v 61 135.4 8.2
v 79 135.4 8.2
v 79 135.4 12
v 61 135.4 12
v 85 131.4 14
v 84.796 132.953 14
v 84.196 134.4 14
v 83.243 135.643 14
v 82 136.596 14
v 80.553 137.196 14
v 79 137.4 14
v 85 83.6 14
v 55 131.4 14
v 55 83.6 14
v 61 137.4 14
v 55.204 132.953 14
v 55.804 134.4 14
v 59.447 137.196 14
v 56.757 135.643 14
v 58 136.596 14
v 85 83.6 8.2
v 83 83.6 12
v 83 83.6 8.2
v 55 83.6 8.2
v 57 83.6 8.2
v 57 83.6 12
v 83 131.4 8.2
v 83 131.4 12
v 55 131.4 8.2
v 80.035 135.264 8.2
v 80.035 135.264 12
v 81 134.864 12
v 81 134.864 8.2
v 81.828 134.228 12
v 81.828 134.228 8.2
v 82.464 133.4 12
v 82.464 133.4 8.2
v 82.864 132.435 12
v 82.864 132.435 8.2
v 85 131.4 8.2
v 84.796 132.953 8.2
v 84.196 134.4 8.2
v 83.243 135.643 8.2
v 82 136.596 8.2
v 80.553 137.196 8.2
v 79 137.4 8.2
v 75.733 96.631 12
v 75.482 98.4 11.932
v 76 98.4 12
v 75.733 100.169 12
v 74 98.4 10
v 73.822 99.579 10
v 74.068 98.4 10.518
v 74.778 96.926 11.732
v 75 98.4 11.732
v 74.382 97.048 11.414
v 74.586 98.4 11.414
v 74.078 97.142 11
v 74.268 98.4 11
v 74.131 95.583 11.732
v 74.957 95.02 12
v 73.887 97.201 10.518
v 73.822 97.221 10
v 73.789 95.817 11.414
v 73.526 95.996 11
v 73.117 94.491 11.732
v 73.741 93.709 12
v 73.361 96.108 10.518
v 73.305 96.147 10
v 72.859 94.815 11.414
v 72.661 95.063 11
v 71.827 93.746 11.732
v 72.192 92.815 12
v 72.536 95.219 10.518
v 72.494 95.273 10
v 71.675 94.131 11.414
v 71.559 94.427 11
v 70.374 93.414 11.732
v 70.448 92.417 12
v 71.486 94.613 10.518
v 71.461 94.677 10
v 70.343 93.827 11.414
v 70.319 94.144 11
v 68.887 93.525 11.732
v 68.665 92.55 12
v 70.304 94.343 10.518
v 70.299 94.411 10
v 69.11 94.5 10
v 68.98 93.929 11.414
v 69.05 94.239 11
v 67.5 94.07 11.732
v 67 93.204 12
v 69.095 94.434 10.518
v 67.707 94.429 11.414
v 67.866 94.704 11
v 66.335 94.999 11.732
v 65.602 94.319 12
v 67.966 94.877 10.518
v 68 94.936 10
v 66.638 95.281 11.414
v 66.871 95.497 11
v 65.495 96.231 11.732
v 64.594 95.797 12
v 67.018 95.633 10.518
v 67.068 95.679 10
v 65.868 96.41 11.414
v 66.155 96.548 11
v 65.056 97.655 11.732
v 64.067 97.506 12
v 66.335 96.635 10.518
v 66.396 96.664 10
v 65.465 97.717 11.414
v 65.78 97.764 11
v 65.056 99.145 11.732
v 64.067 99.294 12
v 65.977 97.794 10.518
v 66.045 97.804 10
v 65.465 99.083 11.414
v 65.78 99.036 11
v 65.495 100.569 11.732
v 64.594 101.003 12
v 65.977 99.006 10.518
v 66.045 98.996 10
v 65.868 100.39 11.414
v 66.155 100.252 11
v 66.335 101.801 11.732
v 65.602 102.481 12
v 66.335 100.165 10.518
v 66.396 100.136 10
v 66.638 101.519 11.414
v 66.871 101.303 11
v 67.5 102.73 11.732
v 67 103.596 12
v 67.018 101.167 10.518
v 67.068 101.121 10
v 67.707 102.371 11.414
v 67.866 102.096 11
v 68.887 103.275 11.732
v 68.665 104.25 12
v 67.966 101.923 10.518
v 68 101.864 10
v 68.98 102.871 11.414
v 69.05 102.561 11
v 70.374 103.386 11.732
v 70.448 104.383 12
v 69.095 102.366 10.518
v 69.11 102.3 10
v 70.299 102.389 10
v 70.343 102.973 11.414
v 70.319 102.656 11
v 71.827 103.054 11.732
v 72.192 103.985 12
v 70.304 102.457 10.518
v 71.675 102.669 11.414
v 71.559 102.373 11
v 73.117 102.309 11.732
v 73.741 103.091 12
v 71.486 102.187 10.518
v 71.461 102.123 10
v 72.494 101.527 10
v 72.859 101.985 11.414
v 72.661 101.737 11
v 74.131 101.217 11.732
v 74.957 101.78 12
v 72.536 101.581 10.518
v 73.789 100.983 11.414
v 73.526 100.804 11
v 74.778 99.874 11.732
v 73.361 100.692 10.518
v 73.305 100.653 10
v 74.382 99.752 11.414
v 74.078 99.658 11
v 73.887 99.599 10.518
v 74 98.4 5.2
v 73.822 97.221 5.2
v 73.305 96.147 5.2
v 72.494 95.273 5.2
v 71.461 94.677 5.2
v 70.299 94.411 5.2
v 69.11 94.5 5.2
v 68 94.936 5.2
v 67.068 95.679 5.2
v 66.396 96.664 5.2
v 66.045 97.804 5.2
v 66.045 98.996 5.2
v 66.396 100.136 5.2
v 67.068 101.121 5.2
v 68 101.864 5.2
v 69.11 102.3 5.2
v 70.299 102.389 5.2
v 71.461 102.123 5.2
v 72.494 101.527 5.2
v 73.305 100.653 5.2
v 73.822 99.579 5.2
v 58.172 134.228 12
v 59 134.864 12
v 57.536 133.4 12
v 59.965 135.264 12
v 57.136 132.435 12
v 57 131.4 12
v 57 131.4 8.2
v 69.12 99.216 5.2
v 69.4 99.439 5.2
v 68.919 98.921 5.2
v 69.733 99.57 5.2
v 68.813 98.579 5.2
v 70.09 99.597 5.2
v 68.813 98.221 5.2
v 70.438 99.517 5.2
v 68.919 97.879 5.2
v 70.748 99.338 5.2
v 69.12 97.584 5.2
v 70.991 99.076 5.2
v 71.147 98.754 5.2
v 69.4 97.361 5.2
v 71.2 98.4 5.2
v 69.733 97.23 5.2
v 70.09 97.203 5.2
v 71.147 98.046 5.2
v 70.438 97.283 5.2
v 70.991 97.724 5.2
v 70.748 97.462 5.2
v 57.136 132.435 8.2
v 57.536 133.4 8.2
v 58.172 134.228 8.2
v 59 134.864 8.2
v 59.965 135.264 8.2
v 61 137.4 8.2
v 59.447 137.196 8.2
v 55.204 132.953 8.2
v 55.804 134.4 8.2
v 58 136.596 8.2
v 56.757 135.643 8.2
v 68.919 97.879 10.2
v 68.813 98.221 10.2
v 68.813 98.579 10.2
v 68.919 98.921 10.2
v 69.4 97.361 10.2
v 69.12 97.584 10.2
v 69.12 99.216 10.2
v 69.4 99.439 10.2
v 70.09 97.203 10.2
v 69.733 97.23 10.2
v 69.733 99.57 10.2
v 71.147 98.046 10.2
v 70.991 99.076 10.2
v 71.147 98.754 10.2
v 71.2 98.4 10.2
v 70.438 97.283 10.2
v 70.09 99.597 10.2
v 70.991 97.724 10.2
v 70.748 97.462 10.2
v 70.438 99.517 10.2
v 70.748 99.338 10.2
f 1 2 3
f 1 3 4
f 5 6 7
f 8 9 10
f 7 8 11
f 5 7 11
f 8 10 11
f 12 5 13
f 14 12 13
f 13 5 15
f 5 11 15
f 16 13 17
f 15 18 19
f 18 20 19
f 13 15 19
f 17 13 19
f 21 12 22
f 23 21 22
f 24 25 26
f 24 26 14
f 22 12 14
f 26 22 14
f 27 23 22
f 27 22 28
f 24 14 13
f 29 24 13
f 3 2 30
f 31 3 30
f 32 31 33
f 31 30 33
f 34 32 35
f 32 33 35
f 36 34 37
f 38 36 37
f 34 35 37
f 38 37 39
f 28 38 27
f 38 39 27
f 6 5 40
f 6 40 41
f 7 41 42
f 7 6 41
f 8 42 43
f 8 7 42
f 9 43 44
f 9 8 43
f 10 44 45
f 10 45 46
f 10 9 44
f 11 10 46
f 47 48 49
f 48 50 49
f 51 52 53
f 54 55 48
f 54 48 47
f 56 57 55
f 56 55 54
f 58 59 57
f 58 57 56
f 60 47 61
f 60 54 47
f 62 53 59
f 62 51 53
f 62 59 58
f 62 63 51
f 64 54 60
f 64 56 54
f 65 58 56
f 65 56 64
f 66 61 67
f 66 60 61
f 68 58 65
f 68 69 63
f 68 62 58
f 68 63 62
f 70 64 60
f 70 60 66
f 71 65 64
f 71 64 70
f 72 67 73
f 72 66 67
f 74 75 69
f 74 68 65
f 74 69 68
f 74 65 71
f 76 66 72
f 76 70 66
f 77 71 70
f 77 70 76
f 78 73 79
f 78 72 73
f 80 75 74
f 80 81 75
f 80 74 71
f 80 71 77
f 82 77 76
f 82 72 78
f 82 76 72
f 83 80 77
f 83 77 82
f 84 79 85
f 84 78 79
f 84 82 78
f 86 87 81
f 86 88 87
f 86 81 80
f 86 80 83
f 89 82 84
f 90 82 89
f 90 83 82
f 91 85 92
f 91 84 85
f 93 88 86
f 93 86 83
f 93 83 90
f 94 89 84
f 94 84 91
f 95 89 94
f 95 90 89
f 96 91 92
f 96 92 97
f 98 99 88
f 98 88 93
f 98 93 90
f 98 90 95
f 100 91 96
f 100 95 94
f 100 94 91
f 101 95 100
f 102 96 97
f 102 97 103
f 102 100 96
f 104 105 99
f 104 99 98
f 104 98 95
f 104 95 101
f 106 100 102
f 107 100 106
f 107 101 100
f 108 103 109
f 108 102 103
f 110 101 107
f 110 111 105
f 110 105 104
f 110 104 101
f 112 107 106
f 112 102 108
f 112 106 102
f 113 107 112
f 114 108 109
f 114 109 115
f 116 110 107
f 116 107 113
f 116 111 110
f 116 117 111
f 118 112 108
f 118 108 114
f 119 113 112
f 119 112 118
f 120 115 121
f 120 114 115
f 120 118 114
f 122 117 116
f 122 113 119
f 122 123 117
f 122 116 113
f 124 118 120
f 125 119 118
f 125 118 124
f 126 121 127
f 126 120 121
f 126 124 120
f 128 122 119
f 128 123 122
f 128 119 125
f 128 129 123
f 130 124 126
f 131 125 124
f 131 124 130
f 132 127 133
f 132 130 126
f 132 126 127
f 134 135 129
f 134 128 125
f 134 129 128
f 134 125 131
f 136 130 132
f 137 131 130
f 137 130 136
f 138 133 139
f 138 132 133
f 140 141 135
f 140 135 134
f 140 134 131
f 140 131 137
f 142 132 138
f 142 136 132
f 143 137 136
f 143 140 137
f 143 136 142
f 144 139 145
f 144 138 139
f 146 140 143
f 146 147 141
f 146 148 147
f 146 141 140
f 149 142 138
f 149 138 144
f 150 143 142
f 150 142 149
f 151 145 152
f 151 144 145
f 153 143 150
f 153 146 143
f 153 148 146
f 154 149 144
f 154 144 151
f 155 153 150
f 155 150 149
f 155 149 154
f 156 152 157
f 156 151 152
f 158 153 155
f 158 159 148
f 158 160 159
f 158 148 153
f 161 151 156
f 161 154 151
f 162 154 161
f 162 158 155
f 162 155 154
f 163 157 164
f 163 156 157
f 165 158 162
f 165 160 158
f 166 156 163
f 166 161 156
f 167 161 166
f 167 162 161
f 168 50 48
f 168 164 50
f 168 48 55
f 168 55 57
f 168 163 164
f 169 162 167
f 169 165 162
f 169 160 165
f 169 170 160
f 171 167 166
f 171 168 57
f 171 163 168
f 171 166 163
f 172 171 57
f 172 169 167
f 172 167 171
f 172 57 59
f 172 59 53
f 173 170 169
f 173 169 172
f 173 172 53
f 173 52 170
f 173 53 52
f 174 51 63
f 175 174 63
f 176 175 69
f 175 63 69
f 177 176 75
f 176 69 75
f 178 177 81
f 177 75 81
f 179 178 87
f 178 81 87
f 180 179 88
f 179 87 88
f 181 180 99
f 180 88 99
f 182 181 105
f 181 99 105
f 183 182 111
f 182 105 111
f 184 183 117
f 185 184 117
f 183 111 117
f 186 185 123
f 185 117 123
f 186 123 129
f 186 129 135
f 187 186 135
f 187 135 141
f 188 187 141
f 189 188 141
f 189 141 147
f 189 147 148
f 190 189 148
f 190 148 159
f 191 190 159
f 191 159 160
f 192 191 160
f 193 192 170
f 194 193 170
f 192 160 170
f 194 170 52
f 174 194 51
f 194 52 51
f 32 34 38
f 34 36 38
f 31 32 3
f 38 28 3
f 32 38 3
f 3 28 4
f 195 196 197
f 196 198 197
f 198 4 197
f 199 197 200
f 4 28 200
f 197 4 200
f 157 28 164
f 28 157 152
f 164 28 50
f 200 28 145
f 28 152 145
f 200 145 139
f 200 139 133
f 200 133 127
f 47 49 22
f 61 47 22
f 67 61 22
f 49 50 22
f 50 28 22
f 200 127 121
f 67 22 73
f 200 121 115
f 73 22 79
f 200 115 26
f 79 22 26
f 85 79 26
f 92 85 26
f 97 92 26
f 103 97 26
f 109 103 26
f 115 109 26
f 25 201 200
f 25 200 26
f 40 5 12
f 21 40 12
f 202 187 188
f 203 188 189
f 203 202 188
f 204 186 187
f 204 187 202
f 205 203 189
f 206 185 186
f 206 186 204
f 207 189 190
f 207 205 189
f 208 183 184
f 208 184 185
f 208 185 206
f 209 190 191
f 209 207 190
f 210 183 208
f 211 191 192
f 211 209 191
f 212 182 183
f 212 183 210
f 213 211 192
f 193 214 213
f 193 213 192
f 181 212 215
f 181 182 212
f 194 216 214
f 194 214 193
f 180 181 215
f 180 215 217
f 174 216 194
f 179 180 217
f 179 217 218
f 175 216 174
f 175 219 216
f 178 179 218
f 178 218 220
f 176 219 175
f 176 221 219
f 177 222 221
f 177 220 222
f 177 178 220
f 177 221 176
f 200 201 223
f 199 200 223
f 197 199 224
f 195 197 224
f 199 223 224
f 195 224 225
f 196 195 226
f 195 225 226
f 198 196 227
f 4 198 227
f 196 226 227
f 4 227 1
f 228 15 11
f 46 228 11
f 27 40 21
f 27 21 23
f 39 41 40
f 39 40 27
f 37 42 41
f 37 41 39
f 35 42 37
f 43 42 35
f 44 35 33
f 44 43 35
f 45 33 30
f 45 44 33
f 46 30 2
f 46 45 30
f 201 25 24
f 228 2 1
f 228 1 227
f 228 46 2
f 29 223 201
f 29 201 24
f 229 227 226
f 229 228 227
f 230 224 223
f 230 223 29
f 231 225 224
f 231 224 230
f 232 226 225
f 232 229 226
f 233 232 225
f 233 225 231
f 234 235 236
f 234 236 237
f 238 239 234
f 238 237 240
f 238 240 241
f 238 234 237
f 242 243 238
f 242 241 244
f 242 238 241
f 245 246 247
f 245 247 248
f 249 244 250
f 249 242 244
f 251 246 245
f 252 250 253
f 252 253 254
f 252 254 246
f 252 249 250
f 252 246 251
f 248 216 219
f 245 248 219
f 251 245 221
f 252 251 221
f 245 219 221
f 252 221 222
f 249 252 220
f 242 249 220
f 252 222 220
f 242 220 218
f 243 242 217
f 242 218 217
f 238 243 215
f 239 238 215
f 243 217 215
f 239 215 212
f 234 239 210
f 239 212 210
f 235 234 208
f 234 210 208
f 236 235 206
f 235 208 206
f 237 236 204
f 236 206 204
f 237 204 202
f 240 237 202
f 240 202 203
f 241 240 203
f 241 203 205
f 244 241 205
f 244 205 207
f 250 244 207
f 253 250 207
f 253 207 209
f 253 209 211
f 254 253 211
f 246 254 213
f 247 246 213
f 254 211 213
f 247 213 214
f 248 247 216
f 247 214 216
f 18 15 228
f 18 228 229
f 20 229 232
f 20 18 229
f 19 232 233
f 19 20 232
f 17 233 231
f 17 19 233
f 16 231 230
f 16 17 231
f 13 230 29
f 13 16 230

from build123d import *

# Parameters (mm, degrees)
PAD016_DEPTH    = 5.8
POCKET020_DEPTH = 3.8
SKETCH068_R     = 4
PAD017_DEPTH    = 6.8
SKETCH069_R     = 1.2
POCKET021_DEPTH = 5
FILLET002_R     = 2


with BuildPart() as part:
    # Sketch066 (on DatumPlane) → Pad016 (new body)
    with BuildSketch(Plane.XY.offset(14)):
        with BuildLine():
            Line((61, 137.4), (79, 137.4))
            ThreePointArc((85, 131.4), (83.242641, 135.642641), (79, 137.4))
            Line((85, 131.4), (85, 83.6))
            Line((85, 83.6), (55, 83.6))
            Line((55, 83.6), (55, 131.4))
            ThreePointArc((61, 137.4), (56.757359, 135.642641), (55, 131.4))
        make_face()
    extrude(amount=-PAD016_DEPTH)

    # Sketch067 (on Face8 of Pad016) → Pocket020 (cut)
    with BuildSketch(Plane(origin=(0, 0, 8.2), x_dir=(1, 0, 0), z_dir=(0, 0, -1))):
        with BuildLine():
            Line((57, -83.6), (83, -83.6))
            Line((83, -83.6), (83, -131.4))
            ThreePointArc((79, -135.4), (81.828427, -134.228427), (83, -131.4))
            Line((79, -135.4), (61, -135.4))
            ThreePointArc((57, -131.4), (58.171573, -134.228427), (61, -135.4))
            Line((57, -131.4), (57, -83.6))
        make_face()
    extrude(amount=-POCKET020_DEPTH, mode=Mode.SUBTRACT)

    # Sketch068 (on Face14 of Pocket020) → Pad017 (join)
    with BuildSketch(Plane(origin=(0, 0, 12), x_dir=(1, 0, 0), z_dir=(0, 0, -1))):
        with Locations((70, -98.4)):
            Circle(SKETCH068_R)
    extrude(amount=PAD017_DEPTH)

    # Sketch069 (on Face16 of Pad017) → Pocket021 (cut)
    with BuildSketch(Plane(origin=(0, 0, 5.2), x_dir=(1, 0, 0), z_dir=(0, 0, -1))):
        with Locations((70, -98.4)):
            Circle(SKETCH069_R)
    extrude(amount=-POCKET021_DEPTH, mode=Mode.SUBTRACT)

    # Fillet002
    fillet002_edges = [part.edges().sort_by_distance(p)[0] for p in [
        (66, 98.4, 12),
    ]]
    fillet(fillet002_edges, radius=FILLET002_R)


solid = part.part
